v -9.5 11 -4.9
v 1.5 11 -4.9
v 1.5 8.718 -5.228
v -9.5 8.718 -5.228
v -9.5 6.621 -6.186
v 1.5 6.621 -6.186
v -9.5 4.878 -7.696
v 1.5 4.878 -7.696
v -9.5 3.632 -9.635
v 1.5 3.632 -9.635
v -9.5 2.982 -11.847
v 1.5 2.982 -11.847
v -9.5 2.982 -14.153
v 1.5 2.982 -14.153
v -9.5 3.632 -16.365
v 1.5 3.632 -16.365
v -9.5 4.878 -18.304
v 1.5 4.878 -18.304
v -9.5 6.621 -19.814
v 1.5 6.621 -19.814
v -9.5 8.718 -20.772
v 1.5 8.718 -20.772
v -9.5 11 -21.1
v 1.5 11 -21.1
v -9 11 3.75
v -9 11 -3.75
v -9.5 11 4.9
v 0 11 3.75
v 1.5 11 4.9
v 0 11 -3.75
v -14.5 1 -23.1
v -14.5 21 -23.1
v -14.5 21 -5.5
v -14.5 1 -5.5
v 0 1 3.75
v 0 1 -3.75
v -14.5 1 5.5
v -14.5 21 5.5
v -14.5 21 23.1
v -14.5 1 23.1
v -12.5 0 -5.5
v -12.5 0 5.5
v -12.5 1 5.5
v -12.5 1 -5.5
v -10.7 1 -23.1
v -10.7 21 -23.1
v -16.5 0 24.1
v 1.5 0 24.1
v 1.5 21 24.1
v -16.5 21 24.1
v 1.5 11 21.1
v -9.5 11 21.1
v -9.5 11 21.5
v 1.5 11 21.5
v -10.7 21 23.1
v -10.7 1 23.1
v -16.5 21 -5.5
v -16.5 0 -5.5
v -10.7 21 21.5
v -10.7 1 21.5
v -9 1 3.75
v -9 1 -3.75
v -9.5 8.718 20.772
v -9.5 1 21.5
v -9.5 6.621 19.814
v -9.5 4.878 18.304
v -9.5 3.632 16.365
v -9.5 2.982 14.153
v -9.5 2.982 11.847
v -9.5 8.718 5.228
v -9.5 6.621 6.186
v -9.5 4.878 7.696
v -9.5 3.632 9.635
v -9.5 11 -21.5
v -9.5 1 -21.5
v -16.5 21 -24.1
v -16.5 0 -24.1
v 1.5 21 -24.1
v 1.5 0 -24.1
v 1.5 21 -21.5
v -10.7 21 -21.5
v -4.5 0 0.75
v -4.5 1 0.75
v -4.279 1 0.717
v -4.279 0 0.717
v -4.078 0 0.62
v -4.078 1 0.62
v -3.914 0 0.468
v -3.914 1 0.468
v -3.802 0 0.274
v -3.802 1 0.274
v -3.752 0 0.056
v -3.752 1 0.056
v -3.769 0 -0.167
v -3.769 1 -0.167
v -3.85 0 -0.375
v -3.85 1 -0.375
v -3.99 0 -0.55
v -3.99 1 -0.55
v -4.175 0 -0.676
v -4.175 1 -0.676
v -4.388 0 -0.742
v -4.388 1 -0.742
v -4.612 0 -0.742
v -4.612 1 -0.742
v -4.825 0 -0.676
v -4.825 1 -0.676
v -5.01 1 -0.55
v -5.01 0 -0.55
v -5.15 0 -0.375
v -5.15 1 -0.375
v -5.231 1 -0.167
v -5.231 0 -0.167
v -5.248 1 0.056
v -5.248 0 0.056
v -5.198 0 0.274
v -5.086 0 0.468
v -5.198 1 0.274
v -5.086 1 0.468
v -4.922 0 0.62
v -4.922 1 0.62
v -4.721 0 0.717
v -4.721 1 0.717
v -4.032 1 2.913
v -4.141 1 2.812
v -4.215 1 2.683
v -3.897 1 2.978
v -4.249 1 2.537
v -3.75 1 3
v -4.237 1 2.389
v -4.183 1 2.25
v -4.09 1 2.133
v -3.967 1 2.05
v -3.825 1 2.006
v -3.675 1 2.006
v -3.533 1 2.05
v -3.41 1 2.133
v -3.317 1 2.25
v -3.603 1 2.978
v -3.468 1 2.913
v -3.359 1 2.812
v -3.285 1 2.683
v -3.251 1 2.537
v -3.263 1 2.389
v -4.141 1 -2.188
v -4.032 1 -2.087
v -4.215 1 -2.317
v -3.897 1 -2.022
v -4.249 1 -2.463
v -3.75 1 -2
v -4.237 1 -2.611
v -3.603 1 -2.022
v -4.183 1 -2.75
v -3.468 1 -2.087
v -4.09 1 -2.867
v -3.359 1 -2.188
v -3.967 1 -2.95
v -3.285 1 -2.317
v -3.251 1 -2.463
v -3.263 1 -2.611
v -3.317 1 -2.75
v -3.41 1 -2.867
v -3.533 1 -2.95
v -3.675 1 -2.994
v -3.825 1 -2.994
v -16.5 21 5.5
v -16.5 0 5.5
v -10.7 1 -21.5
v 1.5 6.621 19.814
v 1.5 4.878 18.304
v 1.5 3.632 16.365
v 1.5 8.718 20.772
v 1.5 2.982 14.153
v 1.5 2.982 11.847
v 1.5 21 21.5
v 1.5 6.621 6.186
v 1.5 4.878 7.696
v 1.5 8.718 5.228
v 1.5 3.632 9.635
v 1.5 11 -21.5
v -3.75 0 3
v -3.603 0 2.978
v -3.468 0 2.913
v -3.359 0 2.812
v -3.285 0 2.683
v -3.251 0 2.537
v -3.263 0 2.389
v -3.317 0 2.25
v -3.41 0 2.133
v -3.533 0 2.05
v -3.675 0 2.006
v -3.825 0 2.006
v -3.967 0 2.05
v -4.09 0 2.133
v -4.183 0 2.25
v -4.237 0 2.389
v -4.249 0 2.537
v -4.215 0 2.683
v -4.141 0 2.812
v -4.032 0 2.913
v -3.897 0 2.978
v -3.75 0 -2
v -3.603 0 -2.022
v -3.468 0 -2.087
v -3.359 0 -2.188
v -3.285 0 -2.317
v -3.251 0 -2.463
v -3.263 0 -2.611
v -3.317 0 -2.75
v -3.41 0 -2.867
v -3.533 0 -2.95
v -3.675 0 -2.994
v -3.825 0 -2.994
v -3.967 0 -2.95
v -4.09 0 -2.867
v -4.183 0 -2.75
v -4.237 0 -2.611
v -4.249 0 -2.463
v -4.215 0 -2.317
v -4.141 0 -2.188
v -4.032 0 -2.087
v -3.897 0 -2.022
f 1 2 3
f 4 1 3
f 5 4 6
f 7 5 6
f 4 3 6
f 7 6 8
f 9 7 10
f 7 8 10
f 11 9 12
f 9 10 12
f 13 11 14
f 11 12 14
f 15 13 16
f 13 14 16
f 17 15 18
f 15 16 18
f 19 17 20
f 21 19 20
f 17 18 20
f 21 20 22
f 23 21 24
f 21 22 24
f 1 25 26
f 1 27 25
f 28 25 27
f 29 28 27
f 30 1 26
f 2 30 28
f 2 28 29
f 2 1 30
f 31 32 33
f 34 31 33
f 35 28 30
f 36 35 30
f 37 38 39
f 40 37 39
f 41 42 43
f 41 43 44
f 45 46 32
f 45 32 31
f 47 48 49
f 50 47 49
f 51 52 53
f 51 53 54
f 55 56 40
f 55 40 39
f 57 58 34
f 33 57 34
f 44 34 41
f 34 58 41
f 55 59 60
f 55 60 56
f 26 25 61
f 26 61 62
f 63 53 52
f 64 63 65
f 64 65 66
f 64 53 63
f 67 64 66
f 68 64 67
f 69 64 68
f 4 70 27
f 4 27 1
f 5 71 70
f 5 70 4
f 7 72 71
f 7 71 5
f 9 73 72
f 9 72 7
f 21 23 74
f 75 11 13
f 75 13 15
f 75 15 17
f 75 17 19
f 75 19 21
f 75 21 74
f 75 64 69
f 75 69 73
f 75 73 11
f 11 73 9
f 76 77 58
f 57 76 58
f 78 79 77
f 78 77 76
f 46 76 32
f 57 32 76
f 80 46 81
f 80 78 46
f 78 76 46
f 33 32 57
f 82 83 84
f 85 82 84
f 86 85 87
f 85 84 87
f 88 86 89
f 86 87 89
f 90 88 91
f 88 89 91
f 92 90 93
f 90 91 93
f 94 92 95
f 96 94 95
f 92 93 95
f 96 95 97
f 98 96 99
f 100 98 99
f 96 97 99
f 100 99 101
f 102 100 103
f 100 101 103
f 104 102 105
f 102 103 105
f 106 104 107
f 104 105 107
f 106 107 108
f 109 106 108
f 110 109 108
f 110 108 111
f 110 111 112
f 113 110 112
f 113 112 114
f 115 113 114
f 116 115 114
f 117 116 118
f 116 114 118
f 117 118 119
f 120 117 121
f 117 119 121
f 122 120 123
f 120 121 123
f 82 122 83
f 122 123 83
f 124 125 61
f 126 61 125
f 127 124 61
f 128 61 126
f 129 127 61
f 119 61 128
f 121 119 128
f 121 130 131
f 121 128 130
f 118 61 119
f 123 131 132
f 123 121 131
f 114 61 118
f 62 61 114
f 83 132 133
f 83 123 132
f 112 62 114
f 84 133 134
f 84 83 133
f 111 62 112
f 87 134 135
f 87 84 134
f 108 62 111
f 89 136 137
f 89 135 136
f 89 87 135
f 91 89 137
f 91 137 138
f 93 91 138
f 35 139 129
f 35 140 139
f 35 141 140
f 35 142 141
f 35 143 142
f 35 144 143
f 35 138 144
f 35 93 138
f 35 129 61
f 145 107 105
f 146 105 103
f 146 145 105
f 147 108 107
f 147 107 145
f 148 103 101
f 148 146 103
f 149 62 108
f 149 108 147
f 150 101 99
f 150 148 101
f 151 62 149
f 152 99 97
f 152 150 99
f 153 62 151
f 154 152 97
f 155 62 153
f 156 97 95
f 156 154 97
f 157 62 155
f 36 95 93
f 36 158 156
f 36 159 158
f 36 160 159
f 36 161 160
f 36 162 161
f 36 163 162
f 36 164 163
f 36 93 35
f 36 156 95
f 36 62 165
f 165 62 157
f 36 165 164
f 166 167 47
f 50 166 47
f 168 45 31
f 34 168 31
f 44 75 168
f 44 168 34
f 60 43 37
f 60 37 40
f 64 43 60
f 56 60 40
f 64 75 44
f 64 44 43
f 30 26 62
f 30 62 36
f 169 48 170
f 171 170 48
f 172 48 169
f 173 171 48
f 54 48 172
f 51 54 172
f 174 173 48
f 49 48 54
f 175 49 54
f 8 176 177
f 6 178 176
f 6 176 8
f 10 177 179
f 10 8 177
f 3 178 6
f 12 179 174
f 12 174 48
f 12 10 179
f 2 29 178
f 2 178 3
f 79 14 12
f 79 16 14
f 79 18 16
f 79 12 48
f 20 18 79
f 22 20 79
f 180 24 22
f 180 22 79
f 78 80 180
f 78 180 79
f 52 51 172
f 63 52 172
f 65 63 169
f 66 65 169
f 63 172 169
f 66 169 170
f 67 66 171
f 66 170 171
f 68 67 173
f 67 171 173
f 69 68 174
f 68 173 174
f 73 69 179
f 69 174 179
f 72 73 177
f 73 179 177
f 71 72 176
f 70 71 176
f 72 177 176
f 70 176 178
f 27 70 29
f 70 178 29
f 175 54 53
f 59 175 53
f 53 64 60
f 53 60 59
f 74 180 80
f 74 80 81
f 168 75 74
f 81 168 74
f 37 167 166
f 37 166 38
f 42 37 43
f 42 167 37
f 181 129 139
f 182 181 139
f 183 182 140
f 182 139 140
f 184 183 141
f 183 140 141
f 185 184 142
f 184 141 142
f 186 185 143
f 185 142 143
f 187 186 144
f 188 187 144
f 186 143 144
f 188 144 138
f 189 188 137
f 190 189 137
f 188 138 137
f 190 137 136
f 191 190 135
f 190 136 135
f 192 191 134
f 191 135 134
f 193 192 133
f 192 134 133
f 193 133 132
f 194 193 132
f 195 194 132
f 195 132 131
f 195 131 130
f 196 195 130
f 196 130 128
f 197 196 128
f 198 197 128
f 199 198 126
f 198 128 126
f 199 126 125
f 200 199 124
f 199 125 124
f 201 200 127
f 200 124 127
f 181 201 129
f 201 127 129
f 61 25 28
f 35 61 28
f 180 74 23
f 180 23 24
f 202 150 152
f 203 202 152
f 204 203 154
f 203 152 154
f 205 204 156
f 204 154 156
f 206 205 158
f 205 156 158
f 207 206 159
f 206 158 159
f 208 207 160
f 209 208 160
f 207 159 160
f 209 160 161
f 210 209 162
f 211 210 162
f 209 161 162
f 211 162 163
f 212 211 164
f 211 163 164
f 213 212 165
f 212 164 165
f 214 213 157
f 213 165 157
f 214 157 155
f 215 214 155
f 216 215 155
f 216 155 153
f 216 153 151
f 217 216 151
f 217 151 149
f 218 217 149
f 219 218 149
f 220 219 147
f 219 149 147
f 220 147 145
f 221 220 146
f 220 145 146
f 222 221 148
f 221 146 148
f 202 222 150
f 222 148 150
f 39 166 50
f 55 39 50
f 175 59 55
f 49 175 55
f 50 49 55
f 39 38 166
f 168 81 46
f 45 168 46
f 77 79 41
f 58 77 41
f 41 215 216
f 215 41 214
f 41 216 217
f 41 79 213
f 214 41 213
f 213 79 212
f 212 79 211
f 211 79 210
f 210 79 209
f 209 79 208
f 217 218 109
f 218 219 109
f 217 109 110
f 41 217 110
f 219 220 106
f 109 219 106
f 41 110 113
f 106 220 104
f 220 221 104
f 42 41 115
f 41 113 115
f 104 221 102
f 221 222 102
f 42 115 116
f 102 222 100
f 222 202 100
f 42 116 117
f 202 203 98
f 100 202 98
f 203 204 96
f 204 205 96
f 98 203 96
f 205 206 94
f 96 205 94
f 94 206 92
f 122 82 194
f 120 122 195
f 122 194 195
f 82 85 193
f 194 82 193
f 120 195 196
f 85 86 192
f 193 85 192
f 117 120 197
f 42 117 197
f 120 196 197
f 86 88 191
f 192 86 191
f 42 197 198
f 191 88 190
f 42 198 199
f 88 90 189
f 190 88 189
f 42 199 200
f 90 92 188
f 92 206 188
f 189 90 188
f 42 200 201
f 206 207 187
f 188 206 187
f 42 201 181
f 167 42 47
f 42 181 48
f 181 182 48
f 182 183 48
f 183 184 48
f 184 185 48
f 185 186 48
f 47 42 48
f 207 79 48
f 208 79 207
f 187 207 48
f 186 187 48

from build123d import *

# Parameters (mm, degrees)
SKETCH1_W               = 25
SKETCH1_H               = 48.2
BOSS_EXTRUDE1_DEPTH     = 1
SKETCH2_W               = 11
SKETCH2_H               = 43
BOSS_EXTRUDE2_DEPTH     = 10
SKETCH3_R               = 8.1
CUT_EXTRUDE1_DEPTH      = 11
BOSS_EXTRUDE3_DEPTH     = 20
BOSS_EXTRUDE4_DEPTH     = 2
SKETCH7_W               = 48.2
SKETCH7_H               = 21
BOSS_EXTRUDE5_DEPTH     = 2
CUT_EXTRUDE2_DEPTH      = 20
CUT_EXTRUDE2_DEPTH_BACK = 1
SKETCH8_W               = 4
SKETCH8_H               = 11
SKETCH9_W               = 9
SKETCH9_H               = 7.5
CUT_EXTRUDE3_DEPTH      = 10
SKETCH10_R              = 0.75
SKETCH10_R_2            = 0.5
CUT_EXTRUDE4_DEPTH      = 1
SKETCH11_W              = 11
SKETCH11_H              = 48.2
CUT_EXTRUDE5_DEPTH      = 1


with BuildPart() as part:
    # Sketch1 → Boss-Extrude1 (new body)
    with BuildSketch(Plane(origin=(0, 0, 0), x_dir=(1, 0, 0), z_dir=(0, 1, 0))):
        Rectangle(SKETCH1_W, SKETCH1_H)
    extrude(amount=BOSS_EXTRUDE1_DEPTH)

    # Sketch2 → Boss-Extrude2 (add)
    with BuildSketch(Plane(origin=(0, 1, 0), x_dir=(1, 0, 0), z_dir=(0, 1, 0))):
        with Locations((-4, 0)):
            Rectangle(SKETCH2_W, SKETCH2_H)
    extrude(amount=BOSS_EXTRUDE2_DEPTH)

    # Sketch3 → Cut-Extrude1 (cut)
    with BuildSketch(Plane(origin=(1.5, 0, 0), x_dir=(0, 0, -1), z_dir=(1, 0, 0))):
        with Locations((-13, 11)):
            Circle(SKETCH3_R)
        with Locations((13, 11)):
            Circle(SKETCH3_R)
    extrude(amount=-CUT_EXTRUDE1_DEPTH, mode=Mode.SUBTRACT)

    # Sketch4 → Boss-Extrude3 (add)
    with BuildSketch(Plane(origin=(0, 1, 0), x_dir=(1, 0, 0), z_dir=(0, 1, 0))):
        Polygon((-9.5, -21.5), (-10.7, -21.5), (-10.7, -23.1), (-12.5, -23.1), (-12.5, -24.1), (1.5, -24.1), (1.5, -21.5), align=None)
    boss_extrude3 = extrude(amount=BOSS_EXTRUDE3_DEPTH)

    # Mirror2: Boss-Extrude3 across plane
    add(boss_extrude3.mirror(Plane.XY))

    # Sketch5 → Boss-Extrude4 (add)
    with BuildSketch(Plane.ZY.offset(12.5)):
        Polygon((-24.1, 21), (-23.1, 21), (-23.1, 1), (23.1, 1), (23.1, 21), (24.1, 21), (24.1, 0), (-24.1, 0), align=None)
    extrude(amount=BOSS_EXTRUDE4_DEPTH)

    # Sketch7 → Boss-Extrude5 (add)
    with BuildSketch(Plane.ZY.offset(14.5)):
        with Locations((0, 10.5)):
            Rectangle(SKETCH7_W, SKETCH7_H)
    extrude(amount=BOSS_EXTRUDE5_DEPTH)

    # Sketch8 → Cut-Extrude2 (cut, two sides: drawn at the far end of the back side and taken through both)
    with BuildSketch(Plane(origin=(0, 1, 0), x_dir=(1, 0, 0), z_dir=(0, 1, 0)).offset(-CUT_EXTRUDE2_DEPTH_BACK)):
        with Locations((-14.5, 0)):
            Rectangle(SKETCH8_W, SKETCH8_H)
    extrude(amount=CUT_EXTRUDE2_DEPTH + CUT_EXTRUDE2_DEPTH_BACK, mode=Mode.SUBTRACT)

    # Sketch9 → Cut-Extrude3 (cut)
    with BuildSketch(Plane(origin=(0, 11, 0), x_dir=(1, 0, 0), z_dir=(0, 1, 0))):
        with Locations((-4.5, 0)):
            Rectangle(SKETCH9_W, SKETCH9_H)
    extrude(amount=-CUT_EXTRUDE3_DEPTH, mode=Mode.SUBTRACT)

    # Sketch10 → Cut-Extrude4 (cut)
    with BuildSketch(Plane(origin=(0, 1, 0), x_dir=(1, 0, 0), z_dir=(0, 1, 0))):
        with Locations(Location((-4.5, 0, 0), (0, 0, 270))):
            Circle(SKETCH10_R)
        with Locations(Location((-3.75, 2.5, 0), (0, 0, 270))):
            Circle(SKETCH10_R_2)
        with Locations(Location((-3.75, -2.5, 0), (0, 0, 270))):
            Circle(SKETCH10_R_2)
    extrude(amount=-CUT_EXTRUDE4_DEPTH, mode=Mode.SUBTRACT)

    # Sketch11 → Cut-Extrude5 (cut)
    with BuildSketch(Plane(origin=(0, 1, 0), x_dir=(1, 0, 0), z_dir=(0, 1, 0))):
        with Locations((7, 0)):
            Rectangle(SKETCH11_W, SKETCH11_H)
    extrude(amount=-CUT_EXTRUDE5_DEPTH, mode=Mode.SUBTRACT)


solid = part.part
